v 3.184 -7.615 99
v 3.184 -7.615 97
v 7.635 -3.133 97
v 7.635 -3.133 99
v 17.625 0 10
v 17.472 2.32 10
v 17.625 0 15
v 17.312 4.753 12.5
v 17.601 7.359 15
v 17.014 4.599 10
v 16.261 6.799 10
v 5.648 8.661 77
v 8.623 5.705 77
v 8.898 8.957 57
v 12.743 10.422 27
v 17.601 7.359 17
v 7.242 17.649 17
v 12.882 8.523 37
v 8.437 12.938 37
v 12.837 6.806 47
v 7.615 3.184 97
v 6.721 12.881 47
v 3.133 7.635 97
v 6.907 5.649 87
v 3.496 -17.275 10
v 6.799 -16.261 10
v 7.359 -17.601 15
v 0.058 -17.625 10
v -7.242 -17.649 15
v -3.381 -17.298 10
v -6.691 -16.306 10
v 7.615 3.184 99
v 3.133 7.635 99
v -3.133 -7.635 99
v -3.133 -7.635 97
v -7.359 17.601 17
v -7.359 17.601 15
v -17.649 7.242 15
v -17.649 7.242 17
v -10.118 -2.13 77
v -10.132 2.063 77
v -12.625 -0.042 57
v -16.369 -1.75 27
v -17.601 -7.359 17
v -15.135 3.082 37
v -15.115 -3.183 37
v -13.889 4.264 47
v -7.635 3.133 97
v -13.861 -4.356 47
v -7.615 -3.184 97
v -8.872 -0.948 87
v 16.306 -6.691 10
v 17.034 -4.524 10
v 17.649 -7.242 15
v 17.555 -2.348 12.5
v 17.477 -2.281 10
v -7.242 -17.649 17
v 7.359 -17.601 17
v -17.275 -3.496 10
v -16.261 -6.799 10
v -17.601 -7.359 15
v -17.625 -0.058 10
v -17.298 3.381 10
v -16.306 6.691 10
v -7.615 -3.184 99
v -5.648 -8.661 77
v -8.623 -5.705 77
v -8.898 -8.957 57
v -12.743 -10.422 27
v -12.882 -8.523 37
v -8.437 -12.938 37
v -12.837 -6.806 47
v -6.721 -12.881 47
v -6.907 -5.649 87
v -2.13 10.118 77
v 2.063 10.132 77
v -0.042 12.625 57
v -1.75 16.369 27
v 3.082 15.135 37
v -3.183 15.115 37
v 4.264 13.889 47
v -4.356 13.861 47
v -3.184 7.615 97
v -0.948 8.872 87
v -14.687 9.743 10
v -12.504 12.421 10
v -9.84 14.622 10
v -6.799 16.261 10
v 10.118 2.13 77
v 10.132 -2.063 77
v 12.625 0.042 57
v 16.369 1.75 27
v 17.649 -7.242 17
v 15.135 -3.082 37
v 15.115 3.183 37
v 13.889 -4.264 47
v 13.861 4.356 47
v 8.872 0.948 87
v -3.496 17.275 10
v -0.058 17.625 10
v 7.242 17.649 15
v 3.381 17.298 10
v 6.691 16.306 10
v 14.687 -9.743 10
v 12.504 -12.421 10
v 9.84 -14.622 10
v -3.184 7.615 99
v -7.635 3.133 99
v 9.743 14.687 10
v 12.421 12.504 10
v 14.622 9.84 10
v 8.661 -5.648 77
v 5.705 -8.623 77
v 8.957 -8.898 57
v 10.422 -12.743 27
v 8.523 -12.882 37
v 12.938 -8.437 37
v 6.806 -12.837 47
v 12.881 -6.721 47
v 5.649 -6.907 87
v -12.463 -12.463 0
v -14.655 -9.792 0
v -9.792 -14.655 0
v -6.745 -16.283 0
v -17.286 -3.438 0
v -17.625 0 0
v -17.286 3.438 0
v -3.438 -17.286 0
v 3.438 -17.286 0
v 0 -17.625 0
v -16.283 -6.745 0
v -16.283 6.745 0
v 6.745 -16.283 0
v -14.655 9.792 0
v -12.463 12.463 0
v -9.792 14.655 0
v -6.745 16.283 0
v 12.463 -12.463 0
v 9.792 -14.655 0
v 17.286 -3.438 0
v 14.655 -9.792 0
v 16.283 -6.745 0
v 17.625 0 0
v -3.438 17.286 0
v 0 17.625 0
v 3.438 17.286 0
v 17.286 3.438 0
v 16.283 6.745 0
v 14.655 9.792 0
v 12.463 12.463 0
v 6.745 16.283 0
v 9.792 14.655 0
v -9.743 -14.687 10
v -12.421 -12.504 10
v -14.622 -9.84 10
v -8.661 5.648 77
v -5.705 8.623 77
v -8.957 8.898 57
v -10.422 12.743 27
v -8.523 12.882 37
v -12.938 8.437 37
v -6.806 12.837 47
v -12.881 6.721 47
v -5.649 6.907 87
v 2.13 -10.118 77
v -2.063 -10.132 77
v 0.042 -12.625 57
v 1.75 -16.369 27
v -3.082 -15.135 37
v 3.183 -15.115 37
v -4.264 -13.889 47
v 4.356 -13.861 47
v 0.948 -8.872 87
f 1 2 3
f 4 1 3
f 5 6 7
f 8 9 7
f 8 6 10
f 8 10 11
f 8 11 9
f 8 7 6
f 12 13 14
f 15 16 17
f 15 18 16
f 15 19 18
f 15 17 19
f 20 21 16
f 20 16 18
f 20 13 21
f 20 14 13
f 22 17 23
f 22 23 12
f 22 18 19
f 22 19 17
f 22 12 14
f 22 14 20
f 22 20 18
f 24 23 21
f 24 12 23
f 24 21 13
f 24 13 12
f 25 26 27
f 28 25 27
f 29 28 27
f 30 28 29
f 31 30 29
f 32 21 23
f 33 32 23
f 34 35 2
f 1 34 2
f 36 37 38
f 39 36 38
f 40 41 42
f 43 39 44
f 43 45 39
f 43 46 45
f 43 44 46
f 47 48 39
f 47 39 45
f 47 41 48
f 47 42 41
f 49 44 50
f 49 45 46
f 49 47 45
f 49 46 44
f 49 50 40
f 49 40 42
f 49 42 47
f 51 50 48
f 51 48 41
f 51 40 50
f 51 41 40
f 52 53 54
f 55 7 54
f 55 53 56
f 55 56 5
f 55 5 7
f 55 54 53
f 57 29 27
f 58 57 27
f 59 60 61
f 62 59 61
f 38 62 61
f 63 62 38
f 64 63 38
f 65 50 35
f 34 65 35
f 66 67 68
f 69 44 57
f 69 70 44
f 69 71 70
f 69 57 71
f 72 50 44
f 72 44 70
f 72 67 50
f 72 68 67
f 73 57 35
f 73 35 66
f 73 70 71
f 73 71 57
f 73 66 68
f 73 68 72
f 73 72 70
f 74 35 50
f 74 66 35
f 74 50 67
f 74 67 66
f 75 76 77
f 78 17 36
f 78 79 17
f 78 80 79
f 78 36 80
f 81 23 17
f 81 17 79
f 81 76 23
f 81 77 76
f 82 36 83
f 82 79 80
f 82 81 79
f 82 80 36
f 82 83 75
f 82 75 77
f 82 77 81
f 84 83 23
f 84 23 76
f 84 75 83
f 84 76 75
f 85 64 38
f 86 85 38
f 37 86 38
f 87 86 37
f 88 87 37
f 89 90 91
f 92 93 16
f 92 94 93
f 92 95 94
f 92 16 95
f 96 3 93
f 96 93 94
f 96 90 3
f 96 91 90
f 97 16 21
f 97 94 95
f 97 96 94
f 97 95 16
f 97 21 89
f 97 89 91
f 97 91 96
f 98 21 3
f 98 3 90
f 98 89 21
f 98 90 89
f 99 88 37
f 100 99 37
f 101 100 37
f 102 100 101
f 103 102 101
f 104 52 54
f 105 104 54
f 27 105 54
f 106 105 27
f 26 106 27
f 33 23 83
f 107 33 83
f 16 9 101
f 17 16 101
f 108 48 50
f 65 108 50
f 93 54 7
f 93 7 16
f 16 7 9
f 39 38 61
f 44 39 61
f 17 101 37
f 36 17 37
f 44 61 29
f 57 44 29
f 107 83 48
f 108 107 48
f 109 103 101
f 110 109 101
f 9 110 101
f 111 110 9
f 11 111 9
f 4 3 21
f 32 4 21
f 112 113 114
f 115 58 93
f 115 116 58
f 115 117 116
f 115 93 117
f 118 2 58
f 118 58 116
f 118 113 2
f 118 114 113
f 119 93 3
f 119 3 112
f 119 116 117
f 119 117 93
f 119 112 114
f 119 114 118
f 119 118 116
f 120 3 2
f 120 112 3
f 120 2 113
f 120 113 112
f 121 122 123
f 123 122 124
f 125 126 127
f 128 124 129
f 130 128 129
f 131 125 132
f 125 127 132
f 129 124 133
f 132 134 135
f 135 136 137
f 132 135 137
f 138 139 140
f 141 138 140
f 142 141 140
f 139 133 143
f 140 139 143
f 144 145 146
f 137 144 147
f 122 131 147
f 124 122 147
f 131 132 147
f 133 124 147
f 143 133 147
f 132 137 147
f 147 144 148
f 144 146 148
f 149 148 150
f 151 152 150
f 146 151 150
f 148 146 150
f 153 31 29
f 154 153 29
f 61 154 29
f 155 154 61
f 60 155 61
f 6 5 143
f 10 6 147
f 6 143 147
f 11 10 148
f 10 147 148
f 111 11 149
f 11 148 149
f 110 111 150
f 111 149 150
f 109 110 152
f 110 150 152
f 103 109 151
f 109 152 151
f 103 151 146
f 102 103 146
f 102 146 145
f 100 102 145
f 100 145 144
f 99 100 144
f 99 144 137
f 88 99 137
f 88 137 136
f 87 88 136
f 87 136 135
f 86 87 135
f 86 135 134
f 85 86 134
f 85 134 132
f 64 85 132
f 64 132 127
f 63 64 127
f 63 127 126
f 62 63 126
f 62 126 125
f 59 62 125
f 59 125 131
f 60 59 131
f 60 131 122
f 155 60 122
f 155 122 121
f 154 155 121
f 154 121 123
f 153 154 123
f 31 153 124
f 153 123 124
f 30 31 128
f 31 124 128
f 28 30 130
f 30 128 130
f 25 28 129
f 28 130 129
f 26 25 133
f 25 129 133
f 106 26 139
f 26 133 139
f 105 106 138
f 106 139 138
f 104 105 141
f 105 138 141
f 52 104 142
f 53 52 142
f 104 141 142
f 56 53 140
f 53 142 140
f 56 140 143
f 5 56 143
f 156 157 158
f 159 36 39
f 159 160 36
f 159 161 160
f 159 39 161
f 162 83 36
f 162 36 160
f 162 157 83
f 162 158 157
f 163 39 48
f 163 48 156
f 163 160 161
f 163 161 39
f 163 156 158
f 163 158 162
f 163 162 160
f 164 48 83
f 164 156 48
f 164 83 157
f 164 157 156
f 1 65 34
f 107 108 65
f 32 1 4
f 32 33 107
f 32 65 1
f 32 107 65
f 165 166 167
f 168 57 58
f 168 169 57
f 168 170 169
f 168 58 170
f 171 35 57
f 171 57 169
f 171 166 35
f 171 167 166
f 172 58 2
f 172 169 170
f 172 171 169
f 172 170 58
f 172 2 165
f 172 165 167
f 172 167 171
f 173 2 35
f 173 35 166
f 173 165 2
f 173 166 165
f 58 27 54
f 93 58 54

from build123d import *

# Parameters (mm, degrees)
F0_R      = 17.625
F1_DEPTH  = 10
F3_START  = 5
F3_DEPTH  = 2
F6_DEPTH  = 2
F1_FACE_R = 17.625


# Not quite as in the source:
# - a feature names something its author has since deleted; it is built from what else it names


with BuildPart() as f1:
    # F0 (on Top) → F1 (new body)
    with BuildSketch(Plane.XY):
        Circle(F0_R)
    extrude(amount=F1_DEPTH)



with BuildPart() as f3:
    # F2 (on face) → F3 (new body)
    with BuildSketch(Plane.XY.offset(10).offset(F3_START)):
        Polygon((7.3588174532, -17.6007367997), (17.6490700676, -7.2421306223), (17.6007367997, 7.3588174532), (7.2421306223, 17.6490700676), (-7.3588174532, 17.6007367997), (-17.6490700676, 7.2421306223), (-17.6007367997, -7.3588174532), (-7.2421306223, -17.6490700676), align=None)
    extrude(amount=F3_DEPTH)



with BuildPart() as f6:
    # F5 (on offset) → F6 (new body)
    with BuildSketch(Plane.XY.offset(97)):
        Polygon((-7.6354132917, 3.1331203401), (-7.6145031545, -3.1836018769), (-3.1331203401, -7.6354132917), (3.1836018769, -7.6145031545), (7.6354132917, -3.1331203401), (7.6145031545, 3.1836018769), (3.1331203401, 7.6354132917), (-3.1836018769, 7.6145031545), align=None)
    extrude(amount=F6_DEPTH)


with BuildPart() as f3_1:
    add(f3.part)

    add(f6.part)  # F7 merges F6
    # F3_face (on face) → F7 section 0
    with BuildSketch(Plane.XY.offset(17)):
        Polygon((-17.6007367997, -7.3588174532), (-7.2421306223, -17.6490700676), (7.3588174532, -17.6007367997), (17.6490700676, -7.2421306223), (17.6007367997, 7.3588174532), (7.2421306223, 17.6490700676), (-7.3588174532, 17.6007367997), (-17.6490700676, 7.2421306223), align=None)
    # F6_face (on face) → F7 section 1
    with BuildSketch(Plane(origin=(0, 0, 97), x_dir=(1, 0, 0), z_dir=(0, 0, -1))):
        Polygon((-3.1836018769, -7.6145031545), (3.1331203401, -7.6354132917), (7.6145031545, -3.1836018769), (7.6354132917, 3.1331203401), (3.1836018769, 7.6145031545), (-3.1331203401, 7.6354132917), (-7.6145031545, 3.1836018769), (-7.6354132917, -3.1331203401), align=None)
    loft()


with BuildPart() as f1_1:
    add(f1.part)

    add(f3_1.part)  # F8 merges F3
    # F3_face1 (on face) → F8 section 0
    with BuildSketch(Plane(origin=(0, 0, 15), x_dir=(1, 0, 0), z_dir=(0, 0, -1))):
        Polygon((-7.2421306223, 17.6490700676), (-17.6007367997, 7.3588174532), (-17.6490700676, -7.2421306223), (-7.3588174532, -17.6007367997), (7.2421306223, -17.6490700676), (17.6007367997, -7.3588174532), (17.6490700676, 7.2421306223), (7.3588174532, 17.6007367997), align=None)
    # F1_face (on face) → F8 section 1
    with BuildSketch(Plane.XY.offset(10)):
        Circle(F1_FACE_R)
    loft()


solid = f1_1.part
